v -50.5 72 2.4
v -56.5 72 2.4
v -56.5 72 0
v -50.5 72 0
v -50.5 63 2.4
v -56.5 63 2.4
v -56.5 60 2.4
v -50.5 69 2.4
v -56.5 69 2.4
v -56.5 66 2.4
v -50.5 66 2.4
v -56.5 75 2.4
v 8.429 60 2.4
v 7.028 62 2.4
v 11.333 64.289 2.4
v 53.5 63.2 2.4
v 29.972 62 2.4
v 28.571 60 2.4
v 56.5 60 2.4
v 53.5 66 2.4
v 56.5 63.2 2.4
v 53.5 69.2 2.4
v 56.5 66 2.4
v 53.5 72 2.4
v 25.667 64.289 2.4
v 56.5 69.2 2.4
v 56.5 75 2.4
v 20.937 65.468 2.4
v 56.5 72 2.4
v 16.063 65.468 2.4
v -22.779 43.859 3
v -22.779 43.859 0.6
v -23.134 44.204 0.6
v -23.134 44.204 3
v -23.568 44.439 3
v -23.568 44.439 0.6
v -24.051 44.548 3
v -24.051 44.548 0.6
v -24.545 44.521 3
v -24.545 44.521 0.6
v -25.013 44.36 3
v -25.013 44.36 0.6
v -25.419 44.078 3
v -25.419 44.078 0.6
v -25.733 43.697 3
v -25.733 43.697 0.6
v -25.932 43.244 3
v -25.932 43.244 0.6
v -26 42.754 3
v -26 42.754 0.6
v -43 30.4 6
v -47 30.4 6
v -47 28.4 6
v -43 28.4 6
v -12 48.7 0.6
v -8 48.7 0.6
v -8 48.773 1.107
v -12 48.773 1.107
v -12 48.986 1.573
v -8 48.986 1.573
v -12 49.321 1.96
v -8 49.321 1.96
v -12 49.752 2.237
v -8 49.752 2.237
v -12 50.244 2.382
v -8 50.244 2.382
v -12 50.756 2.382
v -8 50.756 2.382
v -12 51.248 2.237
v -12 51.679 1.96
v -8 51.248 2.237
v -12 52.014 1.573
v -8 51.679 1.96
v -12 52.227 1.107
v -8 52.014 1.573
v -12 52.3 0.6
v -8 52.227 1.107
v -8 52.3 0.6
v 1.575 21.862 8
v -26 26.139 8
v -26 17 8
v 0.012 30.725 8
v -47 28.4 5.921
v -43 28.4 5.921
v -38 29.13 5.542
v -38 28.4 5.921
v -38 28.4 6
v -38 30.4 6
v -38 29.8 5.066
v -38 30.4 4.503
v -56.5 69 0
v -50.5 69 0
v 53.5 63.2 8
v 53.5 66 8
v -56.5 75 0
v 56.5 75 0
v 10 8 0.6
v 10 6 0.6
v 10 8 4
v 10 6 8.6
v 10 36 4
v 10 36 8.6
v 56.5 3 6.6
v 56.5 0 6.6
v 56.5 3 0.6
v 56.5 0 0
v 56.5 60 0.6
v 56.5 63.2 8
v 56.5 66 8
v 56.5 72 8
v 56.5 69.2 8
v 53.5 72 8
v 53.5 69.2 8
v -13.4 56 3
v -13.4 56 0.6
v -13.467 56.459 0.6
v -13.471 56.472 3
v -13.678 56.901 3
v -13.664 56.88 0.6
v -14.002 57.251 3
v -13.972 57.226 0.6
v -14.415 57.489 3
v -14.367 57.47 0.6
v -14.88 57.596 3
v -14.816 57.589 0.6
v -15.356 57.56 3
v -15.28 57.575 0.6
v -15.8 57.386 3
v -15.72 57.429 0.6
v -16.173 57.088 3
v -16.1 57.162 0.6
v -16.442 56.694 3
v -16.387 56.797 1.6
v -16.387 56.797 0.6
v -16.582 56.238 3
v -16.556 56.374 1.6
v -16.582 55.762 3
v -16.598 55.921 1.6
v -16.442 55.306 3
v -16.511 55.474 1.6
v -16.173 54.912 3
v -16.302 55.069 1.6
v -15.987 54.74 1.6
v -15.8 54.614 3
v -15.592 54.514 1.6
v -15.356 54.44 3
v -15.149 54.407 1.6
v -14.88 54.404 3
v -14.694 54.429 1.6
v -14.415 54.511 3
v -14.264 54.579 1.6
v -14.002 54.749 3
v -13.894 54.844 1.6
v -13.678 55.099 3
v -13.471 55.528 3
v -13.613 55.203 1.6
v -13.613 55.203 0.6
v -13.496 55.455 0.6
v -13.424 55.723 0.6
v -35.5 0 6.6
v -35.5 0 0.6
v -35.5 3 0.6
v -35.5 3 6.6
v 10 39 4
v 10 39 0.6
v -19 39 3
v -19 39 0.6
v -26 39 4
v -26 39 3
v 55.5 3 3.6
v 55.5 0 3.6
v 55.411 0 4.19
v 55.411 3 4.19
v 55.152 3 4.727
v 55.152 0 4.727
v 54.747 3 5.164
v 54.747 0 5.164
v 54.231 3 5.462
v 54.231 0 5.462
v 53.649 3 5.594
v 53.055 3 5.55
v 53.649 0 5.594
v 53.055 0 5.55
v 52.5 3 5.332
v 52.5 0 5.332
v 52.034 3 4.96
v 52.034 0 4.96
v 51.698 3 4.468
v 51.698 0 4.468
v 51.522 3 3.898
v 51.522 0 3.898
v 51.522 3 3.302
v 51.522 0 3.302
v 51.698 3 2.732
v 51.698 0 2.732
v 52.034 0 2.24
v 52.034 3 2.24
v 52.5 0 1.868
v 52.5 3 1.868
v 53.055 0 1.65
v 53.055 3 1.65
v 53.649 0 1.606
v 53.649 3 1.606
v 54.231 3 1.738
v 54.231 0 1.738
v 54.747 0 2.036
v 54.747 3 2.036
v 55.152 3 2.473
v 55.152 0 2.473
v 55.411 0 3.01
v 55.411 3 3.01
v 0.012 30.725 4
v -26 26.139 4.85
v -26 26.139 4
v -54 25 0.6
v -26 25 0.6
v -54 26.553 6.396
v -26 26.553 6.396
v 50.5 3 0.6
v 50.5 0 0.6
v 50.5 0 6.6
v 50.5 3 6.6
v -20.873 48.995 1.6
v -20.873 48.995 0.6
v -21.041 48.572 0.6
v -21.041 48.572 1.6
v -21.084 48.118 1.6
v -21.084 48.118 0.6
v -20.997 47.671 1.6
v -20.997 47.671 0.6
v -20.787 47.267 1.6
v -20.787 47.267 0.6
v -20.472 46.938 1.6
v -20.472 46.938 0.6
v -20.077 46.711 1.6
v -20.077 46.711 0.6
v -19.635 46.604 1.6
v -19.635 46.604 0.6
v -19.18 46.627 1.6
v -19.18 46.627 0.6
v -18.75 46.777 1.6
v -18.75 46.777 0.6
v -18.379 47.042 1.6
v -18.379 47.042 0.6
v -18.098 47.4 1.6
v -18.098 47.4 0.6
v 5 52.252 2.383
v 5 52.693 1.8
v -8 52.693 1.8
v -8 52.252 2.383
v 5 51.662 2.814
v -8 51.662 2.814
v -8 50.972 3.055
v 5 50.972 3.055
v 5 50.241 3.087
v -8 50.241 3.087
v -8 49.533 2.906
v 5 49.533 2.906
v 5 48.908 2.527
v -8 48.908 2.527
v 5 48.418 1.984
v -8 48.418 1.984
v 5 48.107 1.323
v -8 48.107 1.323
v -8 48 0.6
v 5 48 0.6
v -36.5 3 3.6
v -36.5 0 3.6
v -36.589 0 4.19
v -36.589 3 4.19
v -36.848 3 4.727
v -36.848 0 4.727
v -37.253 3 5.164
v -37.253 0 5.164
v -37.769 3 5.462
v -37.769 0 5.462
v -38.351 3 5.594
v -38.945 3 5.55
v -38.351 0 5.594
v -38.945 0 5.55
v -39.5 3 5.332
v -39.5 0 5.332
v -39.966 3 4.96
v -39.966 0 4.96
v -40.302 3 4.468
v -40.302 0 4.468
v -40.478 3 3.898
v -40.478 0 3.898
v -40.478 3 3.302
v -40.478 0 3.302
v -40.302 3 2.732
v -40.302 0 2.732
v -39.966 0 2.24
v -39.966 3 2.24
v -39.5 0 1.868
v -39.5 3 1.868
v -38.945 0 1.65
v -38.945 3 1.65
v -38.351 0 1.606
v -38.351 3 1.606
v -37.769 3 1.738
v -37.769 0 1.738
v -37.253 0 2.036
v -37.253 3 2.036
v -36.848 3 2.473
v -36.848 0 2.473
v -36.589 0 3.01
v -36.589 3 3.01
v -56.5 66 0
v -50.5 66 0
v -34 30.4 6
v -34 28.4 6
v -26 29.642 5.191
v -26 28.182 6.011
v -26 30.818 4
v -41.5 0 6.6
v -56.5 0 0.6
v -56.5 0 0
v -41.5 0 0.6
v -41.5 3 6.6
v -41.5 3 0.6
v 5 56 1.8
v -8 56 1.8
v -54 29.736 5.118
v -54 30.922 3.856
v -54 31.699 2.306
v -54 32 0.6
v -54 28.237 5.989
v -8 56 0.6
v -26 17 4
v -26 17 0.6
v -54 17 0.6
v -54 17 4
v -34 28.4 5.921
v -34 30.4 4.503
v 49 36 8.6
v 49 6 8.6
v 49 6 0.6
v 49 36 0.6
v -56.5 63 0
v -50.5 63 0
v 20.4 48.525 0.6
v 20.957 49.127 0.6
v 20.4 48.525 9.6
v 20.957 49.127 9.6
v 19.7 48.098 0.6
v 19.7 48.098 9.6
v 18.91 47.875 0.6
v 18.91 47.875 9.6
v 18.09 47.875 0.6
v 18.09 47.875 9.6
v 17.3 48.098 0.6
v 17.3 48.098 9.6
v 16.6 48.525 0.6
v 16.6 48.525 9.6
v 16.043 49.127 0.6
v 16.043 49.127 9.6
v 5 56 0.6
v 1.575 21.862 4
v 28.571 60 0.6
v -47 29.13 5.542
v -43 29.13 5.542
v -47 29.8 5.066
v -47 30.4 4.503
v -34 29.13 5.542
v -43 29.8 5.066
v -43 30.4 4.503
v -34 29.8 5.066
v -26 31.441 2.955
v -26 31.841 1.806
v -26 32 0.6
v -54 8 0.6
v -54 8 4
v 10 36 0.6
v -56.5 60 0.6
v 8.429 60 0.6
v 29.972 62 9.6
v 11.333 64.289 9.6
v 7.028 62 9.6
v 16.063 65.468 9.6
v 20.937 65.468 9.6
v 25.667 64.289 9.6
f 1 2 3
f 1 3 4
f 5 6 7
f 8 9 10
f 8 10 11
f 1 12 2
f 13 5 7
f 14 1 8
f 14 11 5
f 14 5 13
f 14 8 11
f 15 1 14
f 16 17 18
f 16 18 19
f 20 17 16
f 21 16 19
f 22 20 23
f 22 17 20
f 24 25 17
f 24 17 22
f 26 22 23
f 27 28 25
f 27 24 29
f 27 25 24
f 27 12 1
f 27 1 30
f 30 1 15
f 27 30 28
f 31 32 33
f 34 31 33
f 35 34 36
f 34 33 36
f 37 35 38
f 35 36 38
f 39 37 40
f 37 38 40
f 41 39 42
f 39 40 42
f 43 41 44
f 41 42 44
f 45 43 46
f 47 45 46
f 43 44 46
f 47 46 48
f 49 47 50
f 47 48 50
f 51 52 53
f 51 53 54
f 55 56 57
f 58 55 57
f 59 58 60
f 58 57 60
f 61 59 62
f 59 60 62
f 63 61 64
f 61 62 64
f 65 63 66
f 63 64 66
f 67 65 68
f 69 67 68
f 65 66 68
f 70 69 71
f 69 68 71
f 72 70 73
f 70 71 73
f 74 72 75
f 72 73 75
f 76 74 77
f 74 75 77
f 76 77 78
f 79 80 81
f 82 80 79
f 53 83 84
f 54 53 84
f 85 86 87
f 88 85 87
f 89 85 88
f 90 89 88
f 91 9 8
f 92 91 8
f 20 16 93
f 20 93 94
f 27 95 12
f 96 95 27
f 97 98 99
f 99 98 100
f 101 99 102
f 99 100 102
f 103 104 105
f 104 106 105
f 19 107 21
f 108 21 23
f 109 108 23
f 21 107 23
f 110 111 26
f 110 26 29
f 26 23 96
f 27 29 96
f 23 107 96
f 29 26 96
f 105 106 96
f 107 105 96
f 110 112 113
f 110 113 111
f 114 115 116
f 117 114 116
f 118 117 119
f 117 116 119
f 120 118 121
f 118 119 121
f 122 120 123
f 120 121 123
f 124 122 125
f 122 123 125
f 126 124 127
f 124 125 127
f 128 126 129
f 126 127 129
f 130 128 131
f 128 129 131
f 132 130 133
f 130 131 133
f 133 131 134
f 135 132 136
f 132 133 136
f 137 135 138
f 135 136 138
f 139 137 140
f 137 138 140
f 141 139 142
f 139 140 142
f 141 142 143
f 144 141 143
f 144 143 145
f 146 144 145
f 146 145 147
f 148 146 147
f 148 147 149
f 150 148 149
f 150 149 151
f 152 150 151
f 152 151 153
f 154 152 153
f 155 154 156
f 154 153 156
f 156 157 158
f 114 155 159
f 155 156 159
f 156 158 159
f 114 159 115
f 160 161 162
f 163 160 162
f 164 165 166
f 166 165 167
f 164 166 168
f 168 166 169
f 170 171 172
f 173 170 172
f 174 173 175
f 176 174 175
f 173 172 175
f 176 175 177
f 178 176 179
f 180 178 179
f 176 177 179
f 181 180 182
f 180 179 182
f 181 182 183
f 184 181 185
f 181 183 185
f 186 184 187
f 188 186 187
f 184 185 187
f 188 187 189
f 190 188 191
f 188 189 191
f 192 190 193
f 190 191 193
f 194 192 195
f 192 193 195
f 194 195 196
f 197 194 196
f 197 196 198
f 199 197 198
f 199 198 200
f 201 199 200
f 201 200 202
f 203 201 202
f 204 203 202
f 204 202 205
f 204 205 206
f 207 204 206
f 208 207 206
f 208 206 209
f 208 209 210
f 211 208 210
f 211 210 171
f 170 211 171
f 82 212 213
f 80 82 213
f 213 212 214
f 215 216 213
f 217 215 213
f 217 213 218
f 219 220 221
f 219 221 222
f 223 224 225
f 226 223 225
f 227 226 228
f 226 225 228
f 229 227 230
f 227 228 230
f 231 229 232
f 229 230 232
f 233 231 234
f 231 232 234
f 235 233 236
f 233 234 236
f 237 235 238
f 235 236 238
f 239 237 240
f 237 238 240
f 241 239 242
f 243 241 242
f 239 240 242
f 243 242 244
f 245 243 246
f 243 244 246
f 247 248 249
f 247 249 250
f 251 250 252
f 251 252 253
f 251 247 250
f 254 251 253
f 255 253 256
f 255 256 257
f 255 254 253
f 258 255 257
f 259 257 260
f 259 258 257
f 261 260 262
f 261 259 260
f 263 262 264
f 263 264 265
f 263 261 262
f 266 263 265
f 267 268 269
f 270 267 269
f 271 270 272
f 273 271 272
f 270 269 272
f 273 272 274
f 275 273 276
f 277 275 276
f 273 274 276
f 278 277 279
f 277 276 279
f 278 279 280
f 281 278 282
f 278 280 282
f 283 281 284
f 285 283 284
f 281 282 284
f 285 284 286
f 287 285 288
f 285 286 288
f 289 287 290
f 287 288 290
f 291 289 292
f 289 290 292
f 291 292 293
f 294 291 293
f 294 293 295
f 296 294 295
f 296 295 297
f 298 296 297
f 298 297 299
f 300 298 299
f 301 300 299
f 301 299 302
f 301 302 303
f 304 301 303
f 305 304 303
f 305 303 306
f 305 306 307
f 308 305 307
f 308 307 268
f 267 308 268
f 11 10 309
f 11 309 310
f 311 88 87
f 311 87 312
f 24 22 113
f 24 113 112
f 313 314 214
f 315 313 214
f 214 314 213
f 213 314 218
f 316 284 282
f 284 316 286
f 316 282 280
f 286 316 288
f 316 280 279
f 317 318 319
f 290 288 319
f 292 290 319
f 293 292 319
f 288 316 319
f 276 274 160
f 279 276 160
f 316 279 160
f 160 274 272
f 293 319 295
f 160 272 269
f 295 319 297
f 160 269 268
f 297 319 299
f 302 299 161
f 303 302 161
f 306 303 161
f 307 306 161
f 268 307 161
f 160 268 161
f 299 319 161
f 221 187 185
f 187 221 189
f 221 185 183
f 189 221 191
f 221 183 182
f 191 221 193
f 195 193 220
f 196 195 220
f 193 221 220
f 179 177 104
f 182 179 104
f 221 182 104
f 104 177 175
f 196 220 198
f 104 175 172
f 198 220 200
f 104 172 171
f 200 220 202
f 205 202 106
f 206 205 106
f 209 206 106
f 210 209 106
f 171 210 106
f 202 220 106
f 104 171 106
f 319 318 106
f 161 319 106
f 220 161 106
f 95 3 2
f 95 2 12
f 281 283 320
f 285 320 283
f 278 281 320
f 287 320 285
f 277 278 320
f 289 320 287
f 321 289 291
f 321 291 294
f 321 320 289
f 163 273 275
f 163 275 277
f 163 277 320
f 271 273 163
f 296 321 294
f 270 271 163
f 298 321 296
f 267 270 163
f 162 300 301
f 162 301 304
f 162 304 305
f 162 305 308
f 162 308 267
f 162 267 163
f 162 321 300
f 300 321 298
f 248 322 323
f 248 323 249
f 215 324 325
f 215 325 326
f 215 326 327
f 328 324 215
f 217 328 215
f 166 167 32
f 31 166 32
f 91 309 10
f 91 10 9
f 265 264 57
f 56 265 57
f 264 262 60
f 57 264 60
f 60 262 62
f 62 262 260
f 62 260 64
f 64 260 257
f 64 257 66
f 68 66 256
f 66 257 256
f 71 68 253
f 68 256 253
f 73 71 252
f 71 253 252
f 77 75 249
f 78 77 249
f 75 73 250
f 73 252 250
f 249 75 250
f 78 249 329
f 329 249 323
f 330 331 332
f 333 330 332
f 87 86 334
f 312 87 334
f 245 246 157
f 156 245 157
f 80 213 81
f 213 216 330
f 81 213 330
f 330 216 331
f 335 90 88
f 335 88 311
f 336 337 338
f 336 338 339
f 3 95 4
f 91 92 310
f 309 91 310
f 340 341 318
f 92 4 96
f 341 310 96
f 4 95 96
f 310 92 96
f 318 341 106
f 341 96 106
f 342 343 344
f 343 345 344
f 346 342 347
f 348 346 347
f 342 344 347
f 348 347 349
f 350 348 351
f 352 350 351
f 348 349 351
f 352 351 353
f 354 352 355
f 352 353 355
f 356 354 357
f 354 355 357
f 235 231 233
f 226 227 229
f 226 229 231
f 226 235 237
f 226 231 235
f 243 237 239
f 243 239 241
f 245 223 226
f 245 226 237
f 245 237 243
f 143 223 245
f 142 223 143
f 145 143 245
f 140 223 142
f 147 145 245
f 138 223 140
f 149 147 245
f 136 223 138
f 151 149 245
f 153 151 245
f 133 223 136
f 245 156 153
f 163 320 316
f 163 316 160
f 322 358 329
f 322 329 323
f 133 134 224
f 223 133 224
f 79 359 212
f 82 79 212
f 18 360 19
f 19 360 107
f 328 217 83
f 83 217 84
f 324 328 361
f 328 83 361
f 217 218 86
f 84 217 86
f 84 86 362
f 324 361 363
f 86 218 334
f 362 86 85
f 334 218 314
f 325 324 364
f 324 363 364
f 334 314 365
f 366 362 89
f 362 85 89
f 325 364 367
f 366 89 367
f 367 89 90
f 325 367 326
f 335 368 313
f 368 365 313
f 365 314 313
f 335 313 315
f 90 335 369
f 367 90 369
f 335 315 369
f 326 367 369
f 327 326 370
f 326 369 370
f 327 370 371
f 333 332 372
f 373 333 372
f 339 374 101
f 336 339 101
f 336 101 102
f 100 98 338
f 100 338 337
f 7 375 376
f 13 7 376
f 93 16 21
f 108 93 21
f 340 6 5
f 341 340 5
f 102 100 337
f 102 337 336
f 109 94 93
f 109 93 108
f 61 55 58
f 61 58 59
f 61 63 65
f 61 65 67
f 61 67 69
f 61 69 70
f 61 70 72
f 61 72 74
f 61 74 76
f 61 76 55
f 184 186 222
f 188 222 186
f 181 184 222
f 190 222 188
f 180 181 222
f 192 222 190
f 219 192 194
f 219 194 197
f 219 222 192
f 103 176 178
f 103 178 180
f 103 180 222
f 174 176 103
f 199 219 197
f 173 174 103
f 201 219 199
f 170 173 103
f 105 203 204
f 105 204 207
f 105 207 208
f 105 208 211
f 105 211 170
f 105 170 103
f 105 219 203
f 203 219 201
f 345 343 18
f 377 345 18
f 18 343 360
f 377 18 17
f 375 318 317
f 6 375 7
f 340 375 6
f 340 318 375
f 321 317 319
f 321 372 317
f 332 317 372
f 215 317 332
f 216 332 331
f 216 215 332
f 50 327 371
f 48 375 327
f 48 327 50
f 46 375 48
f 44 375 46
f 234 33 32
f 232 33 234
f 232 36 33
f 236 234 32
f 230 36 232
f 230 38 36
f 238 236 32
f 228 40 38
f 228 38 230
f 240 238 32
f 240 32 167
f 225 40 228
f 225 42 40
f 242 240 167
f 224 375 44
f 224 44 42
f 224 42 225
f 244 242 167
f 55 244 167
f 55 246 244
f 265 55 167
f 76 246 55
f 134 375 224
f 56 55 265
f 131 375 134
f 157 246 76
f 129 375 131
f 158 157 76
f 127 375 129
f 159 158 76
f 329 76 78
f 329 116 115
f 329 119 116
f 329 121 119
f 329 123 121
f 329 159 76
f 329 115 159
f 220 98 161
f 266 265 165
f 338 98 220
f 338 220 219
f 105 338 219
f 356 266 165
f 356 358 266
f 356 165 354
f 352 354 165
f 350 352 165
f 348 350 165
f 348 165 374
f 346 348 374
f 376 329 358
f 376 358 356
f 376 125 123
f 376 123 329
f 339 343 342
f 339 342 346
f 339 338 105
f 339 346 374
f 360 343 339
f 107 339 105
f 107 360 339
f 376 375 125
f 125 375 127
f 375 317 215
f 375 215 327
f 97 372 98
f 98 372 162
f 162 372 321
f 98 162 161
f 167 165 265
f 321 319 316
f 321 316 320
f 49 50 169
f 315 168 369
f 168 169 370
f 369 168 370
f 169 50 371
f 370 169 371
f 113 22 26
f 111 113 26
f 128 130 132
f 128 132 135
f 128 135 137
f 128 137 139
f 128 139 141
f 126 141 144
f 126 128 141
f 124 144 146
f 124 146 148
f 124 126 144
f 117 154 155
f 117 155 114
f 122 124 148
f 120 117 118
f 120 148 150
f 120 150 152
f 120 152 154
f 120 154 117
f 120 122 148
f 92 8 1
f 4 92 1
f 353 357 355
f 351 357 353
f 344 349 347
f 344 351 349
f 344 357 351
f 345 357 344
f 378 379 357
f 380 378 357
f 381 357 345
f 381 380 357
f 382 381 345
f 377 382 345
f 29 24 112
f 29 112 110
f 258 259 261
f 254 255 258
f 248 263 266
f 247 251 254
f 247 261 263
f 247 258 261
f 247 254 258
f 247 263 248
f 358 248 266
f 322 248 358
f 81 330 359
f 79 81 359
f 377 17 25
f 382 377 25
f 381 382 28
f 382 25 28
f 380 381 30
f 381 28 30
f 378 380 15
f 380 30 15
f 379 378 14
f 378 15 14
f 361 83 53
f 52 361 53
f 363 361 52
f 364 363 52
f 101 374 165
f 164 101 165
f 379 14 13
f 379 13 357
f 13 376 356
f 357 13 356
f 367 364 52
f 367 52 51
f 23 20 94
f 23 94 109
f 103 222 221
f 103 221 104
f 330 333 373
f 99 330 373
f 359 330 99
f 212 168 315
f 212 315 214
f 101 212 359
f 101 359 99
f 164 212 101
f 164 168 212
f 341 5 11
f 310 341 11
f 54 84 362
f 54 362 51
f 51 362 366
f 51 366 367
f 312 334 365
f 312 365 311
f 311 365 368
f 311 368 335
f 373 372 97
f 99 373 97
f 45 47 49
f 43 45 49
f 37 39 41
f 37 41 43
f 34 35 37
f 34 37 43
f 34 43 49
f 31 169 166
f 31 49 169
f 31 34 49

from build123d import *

# Parameters (mm, degrees)
F0_W      = 113
F0_H      = 75
F1_DEPTH  = 0.6
F2_W      = 113
F2_H      = 15
F3_DEPTH  = 1.8
F5_W      = 30
F5_H      = 8
F6_DEPTH  = 39
F8_DEPTH  = 3.4
F10_DEPTH = 4
F12_DEPTH = 2.4
F14_DEPTH = 28
F15_W     = 4
F15_H     = 2
F16_DEPTH = 5.4
F18_DEPTH = 9
F19_R     = 3
F22_DEPTH = 13
F24_DEPTH = 4
F25_R     = 1.6
F26_DEPTH = 2.4
F28_DEPTH = 1
F29_W     = 3
F29_H     = 2.8
F30_DEPTH = 5.6
F31_W     = 6
F31_H     = 3
F32_DEPTH = 3
F33_W     = 6
F33_H     = 3
F34_DEPTH = 6
F35_R     = 2
F36_DEPTH = 4


with BuildPart() as f1:
    # F0 (on Top) → F1 (new body)
    with BuildSketch(Plane.XY):
        with Locations((0, 37.5)):
            Rectangle(F0_W, F0_H)
    extrude(amount=F1_DEPTH)

    # F2 (on face) → F3 (join)
    with BuildSketch(Plane.XY.offset(0.6)):
        with Locations((0, 67.5)):
            Rectangle(F2_W, F2_H)
    extrude(amount=F3_DEPTH)

    # F5 (on offset) → F6 (join)
    with BuildSketch(Plane.YZ.offset(10)):
        with Locations((21, 4.6)):
            Rectangle(F5_W, F5_H)
    extrude(amount=F6_DEPTH)

    # F7 (on face) → F8 (join)
    with BuildSketch(Plane.XY.offset(0.6)):
        Polygon((-26, 17), (-54, 17), (-54, 8), (10, 8), (10, 39), (-26, 39), align=None)
    extrude(amount=F8_DEPTH)

    # F9 (on face) → F10 (join)
    with BuildSketch(Plane.XY.offset(4)):
        Polygon((-26, 26.13884), (-26, 17), (1.574617, 21.862149), (0.011783, 30.725419), align=None)
    extrude(amount=F10_DEPTH)

    # F11 (on face) → F12 (join)
    with BuildSketch(Plane.XY.offset(0.6)):
        with BuildLine():
            Line((-26, 39), (-19, 39))
            Line((-19, 39), (-22.779166, 43.858928))
            ThreePointArc((-22.779166, 43.858928), (-24.784166, 44.456406), (-26, 42.753835))
            Line((-26, 42.753835), (-26, 39))
        make_face()
    extrude(amount=F12_DEPTH)

    # F13 (on face) → F14 (join)
    with BuildSketch(Plane(origin=(-26, 0, 0), x_dir=(0, -1, 0), z_dir=(-1, 0, 0))):
        with BuildLine():
            ThreePointArc((-26.552914, 6.395555), (-30.374719, 4.530004), (-32, 0.6))
            Line((-32, 0.6), (-25, 0.6))
            Line((-25, 0.6), (-26.552914, 6.395555))
        make_face()
    extrude(amount=F14_DEPTH)

    # F15 (on face) → F16 (join)
    with BuildSketch(Plane.XY.offset(0.6)):
        with Locations((-45, 29.4)):
            Rectangle(F15_W, F15_H)
        with Locations((-36, 29.4)):
            Rectangle(F15_W, F15_H)
    extrude(amount=F16_DEPTH)

    # F17 (on face) → F18 (join)
    with BuildSketch(Plane.XY.offset(0.6)):
        with BuildLine():
            Line((18.5, 45.616959), (29.971529, 62))
            ThreePointArc((29.971529, 62), (18.5, 65.616959), (7.028471, 62))
            Line((7.028471, 62), (18.5, 45.616959))
        make_face()
    extrude(amount=F18_DEPTH)

    # F19
    f19_edges = [f1.edges().sort_by_distance(p)[0] for p in [
        (18.5, 45.616959, 5.1),
    ]]
    fillet(f19_edges, radius=F19_R)

    # F21 (on offset) → F22 (join)
    with BuildSketch(Plane.YZ.offset(5)):
        with BuildLine():
            Line((48.073068, 0), (52.926932, 0))
            ThreePointArc((52.926932, 0), (52.981666, 0.297784), (53, 0.6))
            ThreePointArc((53, 0.6), (52.922078, 1.219303), (52.693171, 1.8))
            ThreePointArc((52.693171, 1.8), (49.592442, 2.92945), (48.073068, 0))
        make_face()
        with BuildLine():
            ThreePointArc((52.693171, 1.8), (52.922078, 1.219303), (53, 0.6))
            Line((53, 0.6), (56, 0.6))
            Line((56, 0.6), (56, 1.8))
            Line((56, 1.8), (52.693171, 1.8))
        make_face()
    extrude(amount=-F22_DEPTH)

    # F23 (on face) → F24 (join)
    with BuildSketch(Plane(origin=(-8, 0, 0), x_dir=(0, -1, 0), z_dir=(-1, 0, 0))):
        with BuildLine():
            Line((-52.197056, 0), (-48.802944, 0))
            ThreePointArc((-48.802944, 0), (-50.5, 2.4), (-52.197056, 0))
        make_face()
    extrude(amount=F24_DEPTH)

    # F25 (on face) → F26 (join)
    with BuildSketch(Plane.XY.offset(0.6)):
        with Locations((-15, 56)):
            Circle(F25_R)
    extrude(amount=F26_DEPTH)

    # F27 (on face) → F28 (join)
    with BuildSketch(Plane.XY.offset(0.6)):
        with BuildLine():
            ThreePointArc((-13.612875, 55.202576), (-14.202576, 57.387125), (-16.387125, 56.797424))
            Line((-16.387125, 56.797424), (-20.872636, 48.994848))
            ThreePointArc((-20.872636, 48.994848), (-20.282935, 46.8103), (-18.098387, 47.4))
            Line((-18.098387, 47.4), (-13.612875, 55.202576))
        make_face()
    extrude(amount=F28_DEPTH)

    # F29 (on face) → F30 (join)
    with BuildSketch(Plane.XY.offset(2.4)):
        with Locations((55, 70.6)):
            Rectangle(F29_W, F29_H)
        with Locations((55, 64.6)):
            Rectangle(F29_W, F29_H)
    extrude(amount=F30_DEPTH)

    # F31 (on face) → F32 (cut)
    with BuildSketch(Plane.XY.offset(2.4)):
        with Locations((-53.5, 70.5)):
            Rectangle(F31_W, F31_H)
        with Locations((-53.5, 64.5)):
            Rectangle(F31_W, F31_H)
    extrude(amount=-F32_DEPTH, mode=Mode.SUBTRACT)

    # F33 (on face) → F34 (join)
    with BuildSketch(Plane.XY.offset(0.6)):
        with Locations((53.5, 1.5)):
            Rectangle(F33_W, F33_H)
        with Locations((-38.5, 1.5)):
            Rectangle(F33_W, F33_H)
    extrude(amount=F34_DEPTH)

    # F35 (on face) → F36 (cut)
    with BuildSketch(Plane.XZ):
        with Locations((53.5, 3.6)):
            Circle(F35_R)
        with Locations((-38.5, 3.6)):
            Circle(F35_R)
    extrude(amount=-F36_DEPTH, mode=Mode.SUBTRACT)


solid = f1.part
